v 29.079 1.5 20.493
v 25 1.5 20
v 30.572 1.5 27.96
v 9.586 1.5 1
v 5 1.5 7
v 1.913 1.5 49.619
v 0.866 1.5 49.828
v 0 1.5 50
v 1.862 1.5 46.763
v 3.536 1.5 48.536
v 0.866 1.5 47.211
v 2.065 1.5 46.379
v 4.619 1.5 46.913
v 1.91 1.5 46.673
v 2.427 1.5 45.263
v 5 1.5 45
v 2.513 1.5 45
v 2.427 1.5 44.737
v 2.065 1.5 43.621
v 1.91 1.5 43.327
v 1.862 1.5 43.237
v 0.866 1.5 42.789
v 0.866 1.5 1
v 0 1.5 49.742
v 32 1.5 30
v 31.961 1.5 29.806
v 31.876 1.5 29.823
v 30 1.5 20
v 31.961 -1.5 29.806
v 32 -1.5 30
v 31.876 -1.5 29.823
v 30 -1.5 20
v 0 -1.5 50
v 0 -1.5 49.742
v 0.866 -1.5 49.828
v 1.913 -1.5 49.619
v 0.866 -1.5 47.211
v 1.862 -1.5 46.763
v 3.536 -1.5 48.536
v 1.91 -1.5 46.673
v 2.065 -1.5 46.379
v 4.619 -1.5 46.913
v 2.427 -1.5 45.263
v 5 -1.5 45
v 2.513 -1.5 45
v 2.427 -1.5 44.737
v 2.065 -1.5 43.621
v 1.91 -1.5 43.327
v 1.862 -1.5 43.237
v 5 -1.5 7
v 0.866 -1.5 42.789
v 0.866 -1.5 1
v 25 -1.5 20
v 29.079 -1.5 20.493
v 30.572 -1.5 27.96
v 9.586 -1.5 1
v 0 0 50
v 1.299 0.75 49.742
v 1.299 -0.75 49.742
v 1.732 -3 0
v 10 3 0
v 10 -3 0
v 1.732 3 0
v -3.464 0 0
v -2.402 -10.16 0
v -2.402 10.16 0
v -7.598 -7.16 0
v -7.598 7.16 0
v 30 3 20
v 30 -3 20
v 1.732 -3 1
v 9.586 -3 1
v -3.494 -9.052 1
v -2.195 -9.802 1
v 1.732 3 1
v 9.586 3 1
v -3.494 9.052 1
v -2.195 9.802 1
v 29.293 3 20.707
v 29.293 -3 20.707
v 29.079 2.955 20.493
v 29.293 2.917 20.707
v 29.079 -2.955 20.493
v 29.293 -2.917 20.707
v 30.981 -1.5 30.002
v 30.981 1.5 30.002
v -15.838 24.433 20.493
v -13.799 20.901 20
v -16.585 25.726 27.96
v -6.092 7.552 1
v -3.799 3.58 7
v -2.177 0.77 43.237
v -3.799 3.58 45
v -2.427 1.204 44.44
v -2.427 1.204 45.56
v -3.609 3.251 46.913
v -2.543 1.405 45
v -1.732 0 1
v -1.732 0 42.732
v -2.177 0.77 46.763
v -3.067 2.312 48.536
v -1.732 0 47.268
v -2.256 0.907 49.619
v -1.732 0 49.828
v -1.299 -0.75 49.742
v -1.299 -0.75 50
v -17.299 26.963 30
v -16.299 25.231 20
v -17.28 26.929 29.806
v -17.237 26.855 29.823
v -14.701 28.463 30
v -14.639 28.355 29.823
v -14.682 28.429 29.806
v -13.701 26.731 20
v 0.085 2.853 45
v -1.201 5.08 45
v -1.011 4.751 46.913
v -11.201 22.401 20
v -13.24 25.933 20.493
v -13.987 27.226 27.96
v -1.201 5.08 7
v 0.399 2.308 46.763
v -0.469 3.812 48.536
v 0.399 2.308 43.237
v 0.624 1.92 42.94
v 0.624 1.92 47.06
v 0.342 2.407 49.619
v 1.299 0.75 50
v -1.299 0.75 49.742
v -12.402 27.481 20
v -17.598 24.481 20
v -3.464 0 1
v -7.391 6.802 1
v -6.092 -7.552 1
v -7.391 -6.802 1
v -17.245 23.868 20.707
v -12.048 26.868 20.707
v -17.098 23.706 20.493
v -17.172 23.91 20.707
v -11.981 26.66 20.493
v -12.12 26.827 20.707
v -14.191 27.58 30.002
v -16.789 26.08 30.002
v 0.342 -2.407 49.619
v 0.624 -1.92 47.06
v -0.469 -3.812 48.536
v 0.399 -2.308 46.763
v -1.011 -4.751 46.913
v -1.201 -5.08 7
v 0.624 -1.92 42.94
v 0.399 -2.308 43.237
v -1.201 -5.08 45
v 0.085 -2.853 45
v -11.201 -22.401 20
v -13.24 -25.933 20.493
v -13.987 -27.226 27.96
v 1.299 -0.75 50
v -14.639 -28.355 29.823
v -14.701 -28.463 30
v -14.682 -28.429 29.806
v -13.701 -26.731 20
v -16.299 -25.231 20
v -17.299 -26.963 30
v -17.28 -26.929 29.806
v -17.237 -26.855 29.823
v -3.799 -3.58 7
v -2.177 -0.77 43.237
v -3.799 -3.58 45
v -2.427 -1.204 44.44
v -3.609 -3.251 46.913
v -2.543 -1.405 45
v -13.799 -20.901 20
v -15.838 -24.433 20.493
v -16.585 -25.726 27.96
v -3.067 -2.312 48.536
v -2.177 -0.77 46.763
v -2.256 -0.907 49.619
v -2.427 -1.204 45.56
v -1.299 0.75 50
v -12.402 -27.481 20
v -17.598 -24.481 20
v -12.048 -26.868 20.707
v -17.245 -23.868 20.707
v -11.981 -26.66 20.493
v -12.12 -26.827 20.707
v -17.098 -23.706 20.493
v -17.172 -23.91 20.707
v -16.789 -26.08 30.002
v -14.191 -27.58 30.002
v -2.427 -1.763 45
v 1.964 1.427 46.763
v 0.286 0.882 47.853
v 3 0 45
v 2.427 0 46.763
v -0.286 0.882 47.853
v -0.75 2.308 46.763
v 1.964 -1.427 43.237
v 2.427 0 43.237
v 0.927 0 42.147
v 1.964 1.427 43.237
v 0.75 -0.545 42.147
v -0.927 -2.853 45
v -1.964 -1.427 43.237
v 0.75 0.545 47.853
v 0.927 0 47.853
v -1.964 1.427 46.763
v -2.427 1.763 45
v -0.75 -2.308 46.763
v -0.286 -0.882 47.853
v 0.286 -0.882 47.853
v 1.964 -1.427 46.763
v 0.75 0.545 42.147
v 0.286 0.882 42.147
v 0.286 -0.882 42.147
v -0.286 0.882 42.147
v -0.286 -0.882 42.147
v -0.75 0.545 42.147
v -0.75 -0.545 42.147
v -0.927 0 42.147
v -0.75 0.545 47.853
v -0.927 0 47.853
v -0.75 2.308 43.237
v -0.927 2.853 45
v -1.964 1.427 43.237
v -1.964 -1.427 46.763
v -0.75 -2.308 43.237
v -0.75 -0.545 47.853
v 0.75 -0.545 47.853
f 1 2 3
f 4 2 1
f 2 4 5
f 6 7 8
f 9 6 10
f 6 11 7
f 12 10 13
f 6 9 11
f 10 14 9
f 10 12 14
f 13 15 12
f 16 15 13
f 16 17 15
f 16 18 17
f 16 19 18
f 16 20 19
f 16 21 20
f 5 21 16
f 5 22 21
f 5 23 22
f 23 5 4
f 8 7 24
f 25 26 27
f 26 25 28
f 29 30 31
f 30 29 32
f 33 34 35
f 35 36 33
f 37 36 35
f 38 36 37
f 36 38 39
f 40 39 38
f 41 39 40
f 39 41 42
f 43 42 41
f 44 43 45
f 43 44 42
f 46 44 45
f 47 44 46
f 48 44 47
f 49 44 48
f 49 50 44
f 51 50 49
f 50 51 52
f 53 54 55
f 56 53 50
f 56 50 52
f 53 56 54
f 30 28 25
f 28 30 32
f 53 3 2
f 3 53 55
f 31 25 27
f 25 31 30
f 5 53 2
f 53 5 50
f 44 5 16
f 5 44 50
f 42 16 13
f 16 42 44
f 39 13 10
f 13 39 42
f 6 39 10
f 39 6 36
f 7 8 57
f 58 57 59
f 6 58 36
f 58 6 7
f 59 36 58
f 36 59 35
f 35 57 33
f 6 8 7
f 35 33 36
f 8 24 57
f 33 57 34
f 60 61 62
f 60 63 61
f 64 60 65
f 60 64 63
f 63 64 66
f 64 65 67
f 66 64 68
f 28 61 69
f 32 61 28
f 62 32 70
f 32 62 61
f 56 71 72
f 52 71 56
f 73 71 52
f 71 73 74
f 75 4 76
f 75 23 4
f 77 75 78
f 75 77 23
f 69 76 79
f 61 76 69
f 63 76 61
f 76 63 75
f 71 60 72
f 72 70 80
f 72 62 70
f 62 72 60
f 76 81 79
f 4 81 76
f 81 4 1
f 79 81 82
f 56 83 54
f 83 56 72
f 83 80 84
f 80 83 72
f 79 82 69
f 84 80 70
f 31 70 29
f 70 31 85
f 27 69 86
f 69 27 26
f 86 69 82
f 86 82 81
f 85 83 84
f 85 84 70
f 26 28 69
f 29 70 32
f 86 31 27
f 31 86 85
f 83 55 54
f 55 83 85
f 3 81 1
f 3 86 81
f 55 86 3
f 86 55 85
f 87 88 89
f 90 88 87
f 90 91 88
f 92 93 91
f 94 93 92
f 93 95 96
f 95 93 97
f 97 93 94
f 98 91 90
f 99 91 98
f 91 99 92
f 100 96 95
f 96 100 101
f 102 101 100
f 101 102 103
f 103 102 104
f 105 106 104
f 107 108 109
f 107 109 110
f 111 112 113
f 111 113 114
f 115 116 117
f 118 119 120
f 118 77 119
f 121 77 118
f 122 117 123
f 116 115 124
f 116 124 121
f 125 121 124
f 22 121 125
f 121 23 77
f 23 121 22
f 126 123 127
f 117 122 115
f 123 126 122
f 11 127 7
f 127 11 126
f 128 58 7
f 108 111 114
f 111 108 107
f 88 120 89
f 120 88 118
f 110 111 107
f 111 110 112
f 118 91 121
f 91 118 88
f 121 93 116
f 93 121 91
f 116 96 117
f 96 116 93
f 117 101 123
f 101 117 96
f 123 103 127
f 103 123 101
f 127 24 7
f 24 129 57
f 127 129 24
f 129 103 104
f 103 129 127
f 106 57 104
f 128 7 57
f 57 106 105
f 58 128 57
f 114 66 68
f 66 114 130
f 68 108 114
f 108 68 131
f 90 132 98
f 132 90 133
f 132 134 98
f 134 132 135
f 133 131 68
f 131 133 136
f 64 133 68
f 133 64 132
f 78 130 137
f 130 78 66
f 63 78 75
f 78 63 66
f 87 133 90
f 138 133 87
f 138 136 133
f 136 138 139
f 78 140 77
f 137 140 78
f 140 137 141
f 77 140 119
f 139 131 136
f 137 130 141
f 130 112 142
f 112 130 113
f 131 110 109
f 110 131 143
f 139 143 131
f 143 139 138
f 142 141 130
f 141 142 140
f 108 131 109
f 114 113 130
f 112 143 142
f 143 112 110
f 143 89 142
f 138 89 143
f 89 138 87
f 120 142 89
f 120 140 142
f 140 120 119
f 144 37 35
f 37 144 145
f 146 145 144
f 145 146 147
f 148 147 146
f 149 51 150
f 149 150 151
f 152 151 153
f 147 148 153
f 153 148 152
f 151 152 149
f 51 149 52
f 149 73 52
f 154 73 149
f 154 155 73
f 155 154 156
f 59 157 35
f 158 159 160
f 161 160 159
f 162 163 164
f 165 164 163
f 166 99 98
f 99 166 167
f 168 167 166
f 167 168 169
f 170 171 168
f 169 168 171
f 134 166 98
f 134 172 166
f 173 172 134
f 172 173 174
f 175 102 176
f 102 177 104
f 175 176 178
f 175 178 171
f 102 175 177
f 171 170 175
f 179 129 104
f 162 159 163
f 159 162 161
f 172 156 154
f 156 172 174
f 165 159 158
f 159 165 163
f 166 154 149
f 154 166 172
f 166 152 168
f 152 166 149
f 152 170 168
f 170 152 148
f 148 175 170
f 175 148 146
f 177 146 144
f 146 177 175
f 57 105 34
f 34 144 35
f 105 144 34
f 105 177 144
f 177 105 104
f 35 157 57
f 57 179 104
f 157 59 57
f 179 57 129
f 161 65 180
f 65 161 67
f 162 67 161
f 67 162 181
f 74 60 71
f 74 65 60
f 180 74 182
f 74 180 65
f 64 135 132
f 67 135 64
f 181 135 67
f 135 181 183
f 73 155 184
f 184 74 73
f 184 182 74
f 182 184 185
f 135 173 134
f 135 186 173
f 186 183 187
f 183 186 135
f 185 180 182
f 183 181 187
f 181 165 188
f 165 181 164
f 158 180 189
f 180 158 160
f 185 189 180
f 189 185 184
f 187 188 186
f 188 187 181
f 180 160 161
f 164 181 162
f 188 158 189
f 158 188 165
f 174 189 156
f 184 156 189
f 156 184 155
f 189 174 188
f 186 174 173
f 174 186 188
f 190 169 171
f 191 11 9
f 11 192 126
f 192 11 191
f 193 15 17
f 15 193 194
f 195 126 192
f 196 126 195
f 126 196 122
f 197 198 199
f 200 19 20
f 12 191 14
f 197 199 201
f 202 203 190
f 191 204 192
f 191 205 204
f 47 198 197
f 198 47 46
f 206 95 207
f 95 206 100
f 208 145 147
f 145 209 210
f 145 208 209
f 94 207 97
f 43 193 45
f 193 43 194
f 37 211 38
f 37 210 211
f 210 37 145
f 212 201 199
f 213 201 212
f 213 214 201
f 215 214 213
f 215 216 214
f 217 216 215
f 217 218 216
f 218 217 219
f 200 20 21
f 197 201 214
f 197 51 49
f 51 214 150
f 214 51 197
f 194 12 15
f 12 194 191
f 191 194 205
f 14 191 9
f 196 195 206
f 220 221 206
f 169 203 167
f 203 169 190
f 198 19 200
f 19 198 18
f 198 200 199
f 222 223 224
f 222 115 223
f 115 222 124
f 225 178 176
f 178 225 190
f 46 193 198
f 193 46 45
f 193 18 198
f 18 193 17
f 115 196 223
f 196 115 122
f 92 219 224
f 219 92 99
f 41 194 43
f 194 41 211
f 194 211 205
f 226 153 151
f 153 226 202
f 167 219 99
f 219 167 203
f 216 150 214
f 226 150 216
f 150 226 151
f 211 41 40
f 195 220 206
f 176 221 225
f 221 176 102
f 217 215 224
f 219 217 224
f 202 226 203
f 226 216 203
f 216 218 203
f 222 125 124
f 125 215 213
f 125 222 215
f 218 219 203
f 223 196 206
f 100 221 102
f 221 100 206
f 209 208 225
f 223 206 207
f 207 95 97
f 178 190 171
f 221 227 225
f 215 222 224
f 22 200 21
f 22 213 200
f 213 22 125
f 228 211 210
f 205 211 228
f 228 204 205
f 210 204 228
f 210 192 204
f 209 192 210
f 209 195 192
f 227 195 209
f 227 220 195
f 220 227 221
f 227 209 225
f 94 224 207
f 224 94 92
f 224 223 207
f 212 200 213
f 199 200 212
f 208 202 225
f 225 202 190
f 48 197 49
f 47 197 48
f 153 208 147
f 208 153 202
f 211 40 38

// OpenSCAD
use <MCAD/2Dshapes.scad>

module triangle (w_b, h, l, centre = false)
{

    points = [
    [0,0],
    [w_b,0],
    [w_b/2,h],
    ];

    trans = (centre == true) ? [-w_b/2,-h/2,0] : [0,0,0] ;

    translate(trans)
        linear_extrude(l)
            polygon(points);
}

module trapezoid (w_b, w_t, h, l, centre = false)
{
    top_offset = ( w_b - w_t )/2;

    points = [
    [0,0],
    [w_b,0],
    [top_offset+w_t,h],
    [top_offset,h]
    ];

    trans = (centre == true) ? [-w_b/2,-h/2,0] : [0,0,0] ;

    translate(trans)
        linear_extrude(l)
            polygon(points);
}

w_shaft = 5;
l_shaft = 50;
w_head = 10;
h_head = 7;
w_arm = 30;
h_arm = 20;
w_arm_end = 5;
point_width = 2;
point_height = 10;
w_point = w_arm + point_width;
h_point = h_arm + point_height;
w_reinforcer = 6;
thk_reinforcer = 1;
thk_hook = 3;

hole_dia = 6;

grap_points = 
[
[0,0],
[w_head,0],
[w_arm,h_arm],
[w_point,h_point],
[w_arm-w_arm_end,h_arm],
[w_shaft,h_head],
[w_shaft,l_shaft-w_shaft],
[0,l_shaft],
[0,0]
];

module arm()
{
    union()
    {
    rotate([90,0,0])
        linear_extrude(height=thk_hook,center=true)
            {
                polygon(grap_points);
                translate([0,l_shaft-w_shaft,0])
                    pieSlice(w_shaft,0,90);
            }
     translate([0,-w_reinforcer/2,0])
                cube([w_head,w_reinforcer,thk_reinforcer]);
            
      l_arm_flange = sqrt ( pow(h_arm, 2) + pow(w_arm-w_head, 2));
            
      arm_flange_angle = atan( (w_arm-w_head)/h_arm );
            
      translate([w_head,-w_reinforcer/2,0])
        rotate([0,-arm_flange_angle,0])
            cube([l_arm_flange,w_reinforcer,thk_reinforcer]);
            
      //l_arm_flange = sqrt ( pow(h_arm, 2) + pow(w_arm-w_head, 2));
      
      w_point = w_arm + point_width;
      h_point = h_arm + point_height;
      arm_point_angle = atan( (point_height)/point_width );
            
            rotate([0,0,-90])
             translate([-w_reinforcer/2,w_arm,h_arm])           
      rotate([arm_point_angle,0,0])
        
            trapezoid(w_reinforcer,thk_hook,point_height,thk_reinforcer,0);      
            
      }
}

difference()
{
    union()
    {
    arm();
    rotate([0,0,120])
        arm();
    rotate([0,0,2*120])
        arm();
    }
    
    translate([0,0,l_shaft-w_shaft])
        sphere(d=hole_dia);
}
